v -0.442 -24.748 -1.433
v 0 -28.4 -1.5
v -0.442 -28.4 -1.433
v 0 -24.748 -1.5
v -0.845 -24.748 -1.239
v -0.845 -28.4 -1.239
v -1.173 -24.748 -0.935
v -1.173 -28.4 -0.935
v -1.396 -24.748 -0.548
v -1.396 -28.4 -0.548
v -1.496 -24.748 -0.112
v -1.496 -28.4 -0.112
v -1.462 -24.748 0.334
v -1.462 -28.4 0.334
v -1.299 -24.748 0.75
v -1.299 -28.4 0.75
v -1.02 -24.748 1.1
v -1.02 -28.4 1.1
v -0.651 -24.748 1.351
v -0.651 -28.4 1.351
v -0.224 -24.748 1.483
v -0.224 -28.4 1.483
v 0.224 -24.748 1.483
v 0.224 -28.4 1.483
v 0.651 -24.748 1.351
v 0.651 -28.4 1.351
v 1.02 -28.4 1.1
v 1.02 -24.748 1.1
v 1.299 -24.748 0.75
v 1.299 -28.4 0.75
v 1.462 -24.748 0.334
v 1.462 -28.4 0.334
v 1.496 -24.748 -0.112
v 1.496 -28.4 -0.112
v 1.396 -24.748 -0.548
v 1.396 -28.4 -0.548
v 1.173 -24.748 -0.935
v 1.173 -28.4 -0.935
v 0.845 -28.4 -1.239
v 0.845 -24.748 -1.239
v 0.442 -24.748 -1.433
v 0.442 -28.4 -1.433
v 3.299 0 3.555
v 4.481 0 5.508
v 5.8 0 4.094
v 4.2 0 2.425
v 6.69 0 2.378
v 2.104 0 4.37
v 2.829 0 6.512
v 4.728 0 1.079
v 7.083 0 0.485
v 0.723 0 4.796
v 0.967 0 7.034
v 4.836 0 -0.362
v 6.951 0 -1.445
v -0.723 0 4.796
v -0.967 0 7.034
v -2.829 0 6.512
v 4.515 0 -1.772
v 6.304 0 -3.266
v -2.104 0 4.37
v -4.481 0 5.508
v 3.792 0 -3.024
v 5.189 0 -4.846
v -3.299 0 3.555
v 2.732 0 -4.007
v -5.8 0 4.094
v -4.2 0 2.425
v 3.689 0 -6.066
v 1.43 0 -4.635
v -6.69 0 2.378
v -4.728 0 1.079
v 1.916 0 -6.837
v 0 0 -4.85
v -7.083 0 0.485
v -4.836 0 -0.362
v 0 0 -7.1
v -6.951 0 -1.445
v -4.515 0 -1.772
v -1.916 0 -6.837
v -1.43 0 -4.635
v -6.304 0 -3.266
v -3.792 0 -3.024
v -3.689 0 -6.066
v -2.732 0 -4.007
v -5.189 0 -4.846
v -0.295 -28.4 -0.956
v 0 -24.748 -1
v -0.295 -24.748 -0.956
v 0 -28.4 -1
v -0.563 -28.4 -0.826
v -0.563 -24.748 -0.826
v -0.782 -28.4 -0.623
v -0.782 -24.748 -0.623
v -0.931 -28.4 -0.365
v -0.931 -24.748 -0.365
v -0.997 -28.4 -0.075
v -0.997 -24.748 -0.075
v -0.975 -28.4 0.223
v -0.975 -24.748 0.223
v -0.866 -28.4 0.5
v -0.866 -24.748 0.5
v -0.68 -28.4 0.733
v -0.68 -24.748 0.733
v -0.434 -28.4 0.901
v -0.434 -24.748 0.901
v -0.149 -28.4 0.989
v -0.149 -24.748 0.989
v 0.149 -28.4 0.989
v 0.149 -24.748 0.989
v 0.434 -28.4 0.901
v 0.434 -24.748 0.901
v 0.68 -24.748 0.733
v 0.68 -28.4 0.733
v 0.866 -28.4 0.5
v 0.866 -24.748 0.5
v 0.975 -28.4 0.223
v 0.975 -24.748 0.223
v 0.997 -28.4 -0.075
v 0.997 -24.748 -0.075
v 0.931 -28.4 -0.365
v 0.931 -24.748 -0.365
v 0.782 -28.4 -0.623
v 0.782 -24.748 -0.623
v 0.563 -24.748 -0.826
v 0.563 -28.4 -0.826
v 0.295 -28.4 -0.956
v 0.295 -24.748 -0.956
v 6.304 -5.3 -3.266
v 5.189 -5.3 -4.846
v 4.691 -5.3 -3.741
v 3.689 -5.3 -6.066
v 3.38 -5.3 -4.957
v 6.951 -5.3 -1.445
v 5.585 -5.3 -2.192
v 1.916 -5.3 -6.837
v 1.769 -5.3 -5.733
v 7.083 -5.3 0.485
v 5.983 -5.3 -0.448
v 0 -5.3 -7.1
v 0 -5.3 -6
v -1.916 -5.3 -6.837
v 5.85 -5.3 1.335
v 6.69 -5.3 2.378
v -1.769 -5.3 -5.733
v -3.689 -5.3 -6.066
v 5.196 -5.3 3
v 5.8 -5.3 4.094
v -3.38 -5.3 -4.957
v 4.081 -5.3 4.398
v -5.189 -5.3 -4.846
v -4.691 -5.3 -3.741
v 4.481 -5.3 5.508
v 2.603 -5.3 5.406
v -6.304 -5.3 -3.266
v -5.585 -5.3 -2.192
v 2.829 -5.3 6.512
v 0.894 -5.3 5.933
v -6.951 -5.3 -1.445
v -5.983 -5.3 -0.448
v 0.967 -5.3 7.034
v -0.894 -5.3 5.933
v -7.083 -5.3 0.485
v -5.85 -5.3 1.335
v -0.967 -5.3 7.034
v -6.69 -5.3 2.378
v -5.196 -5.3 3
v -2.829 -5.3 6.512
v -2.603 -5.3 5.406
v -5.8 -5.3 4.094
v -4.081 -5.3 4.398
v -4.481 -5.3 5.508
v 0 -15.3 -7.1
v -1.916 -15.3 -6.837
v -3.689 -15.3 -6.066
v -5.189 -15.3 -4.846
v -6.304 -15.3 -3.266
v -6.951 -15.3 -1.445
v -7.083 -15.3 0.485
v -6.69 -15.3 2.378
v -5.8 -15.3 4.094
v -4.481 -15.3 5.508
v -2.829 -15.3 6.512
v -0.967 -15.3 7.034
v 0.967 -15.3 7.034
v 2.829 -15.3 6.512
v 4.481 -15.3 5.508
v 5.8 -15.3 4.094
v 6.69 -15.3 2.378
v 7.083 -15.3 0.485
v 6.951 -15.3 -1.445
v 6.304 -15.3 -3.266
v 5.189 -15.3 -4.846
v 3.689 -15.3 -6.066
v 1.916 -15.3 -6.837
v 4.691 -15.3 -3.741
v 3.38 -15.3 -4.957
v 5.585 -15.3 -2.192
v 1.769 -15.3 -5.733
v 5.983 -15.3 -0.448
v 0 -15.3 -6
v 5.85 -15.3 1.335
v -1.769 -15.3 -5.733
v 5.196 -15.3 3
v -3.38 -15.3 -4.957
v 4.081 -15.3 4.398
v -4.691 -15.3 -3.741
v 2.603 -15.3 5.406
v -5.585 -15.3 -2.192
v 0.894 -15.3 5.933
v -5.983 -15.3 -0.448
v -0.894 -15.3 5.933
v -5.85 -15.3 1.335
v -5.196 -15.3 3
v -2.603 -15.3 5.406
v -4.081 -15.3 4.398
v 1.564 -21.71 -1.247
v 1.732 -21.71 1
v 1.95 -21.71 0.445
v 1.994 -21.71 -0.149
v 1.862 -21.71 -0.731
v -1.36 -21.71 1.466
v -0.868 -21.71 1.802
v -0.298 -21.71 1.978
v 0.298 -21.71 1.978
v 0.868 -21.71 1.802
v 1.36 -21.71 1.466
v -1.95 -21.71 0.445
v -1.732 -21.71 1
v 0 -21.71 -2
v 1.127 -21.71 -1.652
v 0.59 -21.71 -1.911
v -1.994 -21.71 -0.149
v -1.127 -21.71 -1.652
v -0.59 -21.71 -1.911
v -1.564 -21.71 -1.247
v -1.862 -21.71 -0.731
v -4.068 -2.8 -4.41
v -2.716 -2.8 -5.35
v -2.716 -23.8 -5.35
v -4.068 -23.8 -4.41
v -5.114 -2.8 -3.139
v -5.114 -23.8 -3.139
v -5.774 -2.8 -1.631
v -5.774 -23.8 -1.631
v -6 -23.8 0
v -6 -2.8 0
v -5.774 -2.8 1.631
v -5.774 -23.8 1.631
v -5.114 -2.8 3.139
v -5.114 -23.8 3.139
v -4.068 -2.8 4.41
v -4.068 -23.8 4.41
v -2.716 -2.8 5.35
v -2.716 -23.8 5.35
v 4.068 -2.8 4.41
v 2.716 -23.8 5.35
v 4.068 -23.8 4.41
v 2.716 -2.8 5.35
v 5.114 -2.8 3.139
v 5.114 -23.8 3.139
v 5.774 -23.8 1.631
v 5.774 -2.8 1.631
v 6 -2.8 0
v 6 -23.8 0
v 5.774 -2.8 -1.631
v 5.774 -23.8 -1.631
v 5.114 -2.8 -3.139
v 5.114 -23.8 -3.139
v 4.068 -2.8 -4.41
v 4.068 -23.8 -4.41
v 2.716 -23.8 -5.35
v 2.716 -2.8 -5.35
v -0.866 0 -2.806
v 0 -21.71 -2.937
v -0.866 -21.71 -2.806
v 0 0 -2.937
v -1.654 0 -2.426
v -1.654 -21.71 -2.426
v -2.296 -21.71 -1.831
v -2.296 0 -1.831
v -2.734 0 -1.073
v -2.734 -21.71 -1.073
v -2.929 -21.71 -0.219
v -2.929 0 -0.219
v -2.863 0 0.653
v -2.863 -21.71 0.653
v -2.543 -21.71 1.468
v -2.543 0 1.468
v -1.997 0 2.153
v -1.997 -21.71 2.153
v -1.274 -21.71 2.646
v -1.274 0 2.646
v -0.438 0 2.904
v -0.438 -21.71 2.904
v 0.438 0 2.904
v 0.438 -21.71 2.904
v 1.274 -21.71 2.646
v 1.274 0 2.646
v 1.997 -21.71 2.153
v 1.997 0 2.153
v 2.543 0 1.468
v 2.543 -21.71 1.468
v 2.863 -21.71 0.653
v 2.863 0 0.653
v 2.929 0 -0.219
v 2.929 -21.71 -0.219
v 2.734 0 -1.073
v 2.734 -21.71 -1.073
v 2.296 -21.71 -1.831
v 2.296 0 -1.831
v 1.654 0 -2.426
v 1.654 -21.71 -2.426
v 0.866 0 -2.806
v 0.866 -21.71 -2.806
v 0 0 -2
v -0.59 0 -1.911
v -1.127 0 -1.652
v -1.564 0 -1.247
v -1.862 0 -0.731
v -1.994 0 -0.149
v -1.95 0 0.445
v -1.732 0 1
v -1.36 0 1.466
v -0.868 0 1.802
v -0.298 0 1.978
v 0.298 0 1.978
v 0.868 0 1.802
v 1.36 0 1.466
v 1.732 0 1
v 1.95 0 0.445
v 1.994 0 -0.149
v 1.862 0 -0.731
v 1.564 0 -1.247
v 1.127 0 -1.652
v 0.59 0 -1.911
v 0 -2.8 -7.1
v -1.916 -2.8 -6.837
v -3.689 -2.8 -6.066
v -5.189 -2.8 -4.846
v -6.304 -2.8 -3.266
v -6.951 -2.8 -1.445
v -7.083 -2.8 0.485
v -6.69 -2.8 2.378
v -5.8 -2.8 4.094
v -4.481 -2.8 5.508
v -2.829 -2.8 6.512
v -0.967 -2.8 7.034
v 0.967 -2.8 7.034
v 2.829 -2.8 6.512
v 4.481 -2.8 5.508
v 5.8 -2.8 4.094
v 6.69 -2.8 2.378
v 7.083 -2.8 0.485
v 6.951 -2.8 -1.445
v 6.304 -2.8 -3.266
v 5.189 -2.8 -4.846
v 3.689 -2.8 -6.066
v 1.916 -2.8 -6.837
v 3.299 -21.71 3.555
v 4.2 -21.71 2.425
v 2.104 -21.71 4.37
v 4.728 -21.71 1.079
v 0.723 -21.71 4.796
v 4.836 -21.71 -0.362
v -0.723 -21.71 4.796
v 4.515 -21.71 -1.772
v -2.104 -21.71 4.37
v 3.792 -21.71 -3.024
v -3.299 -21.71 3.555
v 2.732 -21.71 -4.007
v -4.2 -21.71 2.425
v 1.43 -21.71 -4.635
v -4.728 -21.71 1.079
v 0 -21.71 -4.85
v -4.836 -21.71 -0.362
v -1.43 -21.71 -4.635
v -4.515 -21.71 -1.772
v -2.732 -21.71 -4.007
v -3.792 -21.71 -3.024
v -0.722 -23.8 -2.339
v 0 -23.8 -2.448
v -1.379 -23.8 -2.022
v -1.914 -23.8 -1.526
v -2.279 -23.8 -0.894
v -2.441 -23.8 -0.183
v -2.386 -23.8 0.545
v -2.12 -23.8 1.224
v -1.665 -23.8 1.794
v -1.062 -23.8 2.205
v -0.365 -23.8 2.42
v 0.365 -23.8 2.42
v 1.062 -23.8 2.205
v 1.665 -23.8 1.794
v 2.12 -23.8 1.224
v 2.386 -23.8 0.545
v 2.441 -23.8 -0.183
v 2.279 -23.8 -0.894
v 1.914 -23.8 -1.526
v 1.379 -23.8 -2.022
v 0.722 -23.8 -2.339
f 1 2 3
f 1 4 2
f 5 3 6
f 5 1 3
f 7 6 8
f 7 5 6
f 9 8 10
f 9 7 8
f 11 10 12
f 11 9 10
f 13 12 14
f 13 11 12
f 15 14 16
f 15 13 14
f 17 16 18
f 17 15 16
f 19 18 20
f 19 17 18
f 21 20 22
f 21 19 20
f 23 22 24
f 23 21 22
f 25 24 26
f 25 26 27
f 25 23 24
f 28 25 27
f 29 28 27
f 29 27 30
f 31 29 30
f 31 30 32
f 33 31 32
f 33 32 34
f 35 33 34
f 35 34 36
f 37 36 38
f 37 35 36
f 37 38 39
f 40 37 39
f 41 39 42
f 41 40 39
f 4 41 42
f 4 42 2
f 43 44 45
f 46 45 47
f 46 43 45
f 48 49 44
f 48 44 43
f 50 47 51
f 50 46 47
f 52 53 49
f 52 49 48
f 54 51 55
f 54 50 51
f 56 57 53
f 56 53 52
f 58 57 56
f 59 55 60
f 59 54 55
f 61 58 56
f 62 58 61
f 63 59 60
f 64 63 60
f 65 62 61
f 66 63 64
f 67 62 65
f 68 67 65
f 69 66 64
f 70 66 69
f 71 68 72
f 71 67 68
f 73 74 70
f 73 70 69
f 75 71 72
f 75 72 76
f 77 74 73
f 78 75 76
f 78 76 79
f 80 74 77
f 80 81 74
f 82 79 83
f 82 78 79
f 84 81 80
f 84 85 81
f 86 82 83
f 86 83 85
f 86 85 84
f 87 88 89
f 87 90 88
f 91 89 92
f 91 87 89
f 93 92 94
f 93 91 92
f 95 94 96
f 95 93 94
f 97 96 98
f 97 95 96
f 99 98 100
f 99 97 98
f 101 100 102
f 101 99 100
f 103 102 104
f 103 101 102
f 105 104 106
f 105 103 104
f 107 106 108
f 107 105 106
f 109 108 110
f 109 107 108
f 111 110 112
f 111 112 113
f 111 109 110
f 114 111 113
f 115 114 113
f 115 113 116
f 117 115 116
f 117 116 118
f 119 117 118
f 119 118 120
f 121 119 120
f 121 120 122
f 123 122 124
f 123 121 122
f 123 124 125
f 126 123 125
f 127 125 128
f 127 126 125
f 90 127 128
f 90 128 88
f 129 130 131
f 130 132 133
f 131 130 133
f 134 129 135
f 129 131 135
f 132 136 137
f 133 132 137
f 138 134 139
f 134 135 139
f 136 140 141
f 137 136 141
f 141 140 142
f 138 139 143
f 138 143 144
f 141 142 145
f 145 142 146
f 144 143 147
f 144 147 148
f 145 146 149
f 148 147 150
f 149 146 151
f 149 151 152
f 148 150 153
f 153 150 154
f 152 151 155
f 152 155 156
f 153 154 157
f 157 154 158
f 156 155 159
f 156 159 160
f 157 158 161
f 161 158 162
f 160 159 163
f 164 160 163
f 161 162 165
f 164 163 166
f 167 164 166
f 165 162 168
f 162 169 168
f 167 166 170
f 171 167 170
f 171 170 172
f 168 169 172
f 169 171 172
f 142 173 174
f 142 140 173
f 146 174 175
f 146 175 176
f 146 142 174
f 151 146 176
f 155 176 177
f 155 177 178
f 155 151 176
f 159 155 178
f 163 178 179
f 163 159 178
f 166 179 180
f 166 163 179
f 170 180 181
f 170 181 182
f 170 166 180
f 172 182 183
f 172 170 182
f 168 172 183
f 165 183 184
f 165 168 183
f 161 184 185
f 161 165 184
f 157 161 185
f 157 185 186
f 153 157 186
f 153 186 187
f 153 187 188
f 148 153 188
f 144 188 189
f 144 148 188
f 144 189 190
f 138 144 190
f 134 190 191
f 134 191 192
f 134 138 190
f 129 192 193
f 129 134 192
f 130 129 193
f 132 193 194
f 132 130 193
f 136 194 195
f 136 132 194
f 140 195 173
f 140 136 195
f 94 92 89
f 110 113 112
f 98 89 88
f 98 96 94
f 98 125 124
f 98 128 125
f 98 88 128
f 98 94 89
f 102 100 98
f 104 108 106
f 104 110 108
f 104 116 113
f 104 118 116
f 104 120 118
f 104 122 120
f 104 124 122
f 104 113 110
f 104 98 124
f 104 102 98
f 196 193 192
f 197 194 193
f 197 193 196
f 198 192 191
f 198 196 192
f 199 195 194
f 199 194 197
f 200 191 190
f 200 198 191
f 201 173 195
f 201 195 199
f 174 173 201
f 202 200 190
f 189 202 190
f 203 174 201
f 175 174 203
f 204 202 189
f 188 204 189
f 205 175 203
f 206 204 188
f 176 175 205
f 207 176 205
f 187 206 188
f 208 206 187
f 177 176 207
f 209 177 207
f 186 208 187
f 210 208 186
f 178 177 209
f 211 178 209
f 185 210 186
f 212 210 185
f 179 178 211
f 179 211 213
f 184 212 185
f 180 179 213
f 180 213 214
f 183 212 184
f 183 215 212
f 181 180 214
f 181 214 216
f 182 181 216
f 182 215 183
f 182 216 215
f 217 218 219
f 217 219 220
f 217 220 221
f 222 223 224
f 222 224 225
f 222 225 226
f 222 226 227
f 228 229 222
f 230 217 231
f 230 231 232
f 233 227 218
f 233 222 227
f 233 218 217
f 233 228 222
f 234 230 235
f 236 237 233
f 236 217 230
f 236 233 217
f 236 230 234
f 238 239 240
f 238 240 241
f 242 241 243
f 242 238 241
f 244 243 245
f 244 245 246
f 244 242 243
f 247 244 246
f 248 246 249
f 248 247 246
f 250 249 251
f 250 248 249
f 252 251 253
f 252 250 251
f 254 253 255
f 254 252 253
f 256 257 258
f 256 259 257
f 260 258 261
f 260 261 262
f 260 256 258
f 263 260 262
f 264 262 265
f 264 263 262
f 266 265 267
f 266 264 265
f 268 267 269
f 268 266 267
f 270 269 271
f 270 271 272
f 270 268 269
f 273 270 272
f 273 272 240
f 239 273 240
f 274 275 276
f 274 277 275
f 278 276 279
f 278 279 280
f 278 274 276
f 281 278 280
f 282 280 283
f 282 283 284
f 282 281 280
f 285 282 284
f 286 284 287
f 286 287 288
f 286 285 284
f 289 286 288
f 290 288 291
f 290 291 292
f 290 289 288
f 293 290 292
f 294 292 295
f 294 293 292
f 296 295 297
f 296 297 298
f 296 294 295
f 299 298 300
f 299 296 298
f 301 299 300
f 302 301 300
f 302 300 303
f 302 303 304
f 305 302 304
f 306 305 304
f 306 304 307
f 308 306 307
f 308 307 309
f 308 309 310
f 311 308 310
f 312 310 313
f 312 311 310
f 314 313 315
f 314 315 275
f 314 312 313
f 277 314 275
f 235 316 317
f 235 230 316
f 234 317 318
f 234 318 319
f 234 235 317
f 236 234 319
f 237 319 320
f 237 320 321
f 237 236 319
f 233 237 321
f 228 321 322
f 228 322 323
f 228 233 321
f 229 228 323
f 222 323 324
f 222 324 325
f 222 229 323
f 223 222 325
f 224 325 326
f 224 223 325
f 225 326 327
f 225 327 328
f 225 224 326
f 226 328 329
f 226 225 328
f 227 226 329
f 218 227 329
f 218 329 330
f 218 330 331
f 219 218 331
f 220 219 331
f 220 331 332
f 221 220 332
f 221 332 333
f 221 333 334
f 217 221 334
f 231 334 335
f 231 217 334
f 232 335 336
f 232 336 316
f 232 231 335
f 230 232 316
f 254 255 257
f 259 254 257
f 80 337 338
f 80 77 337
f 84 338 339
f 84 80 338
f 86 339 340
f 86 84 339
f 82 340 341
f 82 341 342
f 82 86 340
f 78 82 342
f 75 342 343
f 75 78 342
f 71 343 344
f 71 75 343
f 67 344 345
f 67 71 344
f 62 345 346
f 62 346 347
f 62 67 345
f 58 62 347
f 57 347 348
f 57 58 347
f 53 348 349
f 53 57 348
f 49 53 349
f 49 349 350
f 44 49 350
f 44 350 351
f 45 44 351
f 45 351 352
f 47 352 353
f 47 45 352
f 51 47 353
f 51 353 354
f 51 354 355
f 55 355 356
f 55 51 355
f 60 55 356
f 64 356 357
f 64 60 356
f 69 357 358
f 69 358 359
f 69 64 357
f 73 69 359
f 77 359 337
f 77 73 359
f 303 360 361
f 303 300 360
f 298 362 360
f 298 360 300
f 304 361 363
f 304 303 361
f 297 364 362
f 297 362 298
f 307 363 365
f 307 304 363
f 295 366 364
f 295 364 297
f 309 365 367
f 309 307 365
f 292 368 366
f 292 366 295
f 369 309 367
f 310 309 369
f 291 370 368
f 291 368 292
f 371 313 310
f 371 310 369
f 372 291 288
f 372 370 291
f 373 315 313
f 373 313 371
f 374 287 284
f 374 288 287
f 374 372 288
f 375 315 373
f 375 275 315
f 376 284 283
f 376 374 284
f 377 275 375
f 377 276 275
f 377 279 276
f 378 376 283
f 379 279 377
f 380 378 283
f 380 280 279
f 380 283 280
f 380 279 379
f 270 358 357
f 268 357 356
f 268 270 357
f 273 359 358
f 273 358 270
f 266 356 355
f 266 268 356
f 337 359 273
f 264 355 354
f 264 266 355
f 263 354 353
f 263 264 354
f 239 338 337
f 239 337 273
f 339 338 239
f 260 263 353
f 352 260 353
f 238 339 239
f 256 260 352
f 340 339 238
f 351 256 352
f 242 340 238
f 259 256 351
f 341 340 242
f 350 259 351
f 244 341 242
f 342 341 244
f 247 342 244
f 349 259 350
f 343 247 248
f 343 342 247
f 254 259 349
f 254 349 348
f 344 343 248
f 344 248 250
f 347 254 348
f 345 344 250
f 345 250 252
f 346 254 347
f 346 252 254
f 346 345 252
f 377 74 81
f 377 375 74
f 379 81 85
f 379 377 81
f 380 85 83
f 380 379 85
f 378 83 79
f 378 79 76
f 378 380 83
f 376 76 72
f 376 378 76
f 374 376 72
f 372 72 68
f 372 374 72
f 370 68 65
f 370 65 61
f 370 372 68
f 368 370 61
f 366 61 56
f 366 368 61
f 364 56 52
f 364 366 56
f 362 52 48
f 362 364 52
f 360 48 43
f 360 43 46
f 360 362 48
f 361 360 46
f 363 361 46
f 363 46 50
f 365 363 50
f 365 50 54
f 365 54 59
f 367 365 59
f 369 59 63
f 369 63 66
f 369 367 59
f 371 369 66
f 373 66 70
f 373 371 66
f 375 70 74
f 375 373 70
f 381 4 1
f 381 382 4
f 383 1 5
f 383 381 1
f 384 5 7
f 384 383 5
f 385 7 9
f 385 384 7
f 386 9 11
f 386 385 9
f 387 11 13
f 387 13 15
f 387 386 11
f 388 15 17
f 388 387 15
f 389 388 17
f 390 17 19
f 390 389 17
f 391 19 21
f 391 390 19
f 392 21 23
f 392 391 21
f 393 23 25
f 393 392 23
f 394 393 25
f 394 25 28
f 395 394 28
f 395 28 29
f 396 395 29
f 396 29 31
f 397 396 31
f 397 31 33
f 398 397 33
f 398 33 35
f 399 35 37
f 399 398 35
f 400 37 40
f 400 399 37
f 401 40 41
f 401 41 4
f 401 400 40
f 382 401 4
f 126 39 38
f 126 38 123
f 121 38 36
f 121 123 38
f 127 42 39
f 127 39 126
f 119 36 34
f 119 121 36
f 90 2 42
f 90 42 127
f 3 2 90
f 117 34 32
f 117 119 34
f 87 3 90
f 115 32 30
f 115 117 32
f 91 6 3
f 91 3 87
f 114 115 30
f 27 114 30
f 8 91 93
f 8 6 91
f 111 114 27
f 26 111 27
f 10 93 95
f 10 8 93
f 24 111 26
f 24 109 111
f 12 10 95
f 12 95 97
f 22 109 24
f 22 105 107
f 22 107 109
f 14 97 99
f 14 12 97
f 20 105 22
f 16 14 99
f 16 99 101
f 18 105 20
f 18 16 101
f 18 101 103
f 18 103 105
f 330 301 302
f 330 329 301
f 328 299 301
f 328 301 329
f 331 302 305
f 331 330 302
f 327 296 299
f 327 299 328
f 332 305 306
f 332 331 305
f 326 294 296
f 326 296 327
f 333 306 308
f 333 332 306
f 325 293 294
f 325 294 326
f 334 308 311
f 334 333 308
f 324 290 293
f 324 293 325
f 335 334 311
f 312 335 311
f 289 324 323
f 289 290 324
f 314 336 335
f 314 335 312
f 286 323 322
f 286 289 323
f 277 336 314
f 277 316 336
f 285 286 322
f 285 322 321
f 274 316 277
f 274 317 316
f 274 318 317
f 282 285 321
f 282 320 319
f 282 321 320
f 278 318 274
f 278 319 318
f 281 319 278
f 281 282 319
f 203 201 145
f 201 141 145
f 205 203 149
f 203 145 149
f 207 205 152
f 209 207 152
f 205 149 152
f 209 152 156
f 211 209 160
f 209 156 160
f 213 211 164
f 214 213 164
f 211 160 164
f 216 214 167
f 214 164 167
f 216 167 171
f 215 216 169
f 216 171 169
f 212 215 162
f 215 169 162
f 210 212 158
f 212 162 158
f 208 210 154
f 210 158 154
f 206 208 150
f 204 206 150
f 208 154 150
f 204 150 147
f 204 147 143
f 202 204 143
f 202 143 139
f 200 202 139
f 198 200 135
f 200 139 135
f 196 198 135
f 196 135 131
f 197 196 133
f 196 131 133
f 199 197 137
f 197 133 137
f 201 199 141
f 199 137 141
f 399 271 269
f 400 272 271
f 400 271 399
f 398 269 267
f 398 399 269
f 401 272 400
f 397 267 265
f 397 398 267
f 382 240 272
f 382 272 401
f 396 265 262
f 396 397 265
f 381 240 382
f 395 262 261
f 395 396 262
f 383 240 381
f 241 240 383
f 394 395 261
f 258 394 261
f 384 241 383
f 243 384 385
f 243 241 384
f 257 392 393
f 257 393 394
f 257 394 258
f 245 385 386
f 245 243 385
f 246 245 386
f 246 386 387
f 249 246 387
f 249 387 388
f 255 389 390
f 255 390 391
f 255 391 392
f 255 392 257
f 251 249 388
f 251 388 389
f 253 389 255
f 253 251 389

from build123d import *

# Parameters (mm, degrees)
CUT_EXTRUDE1_START = -21
CUT_EXTRUDE1_DEPTH = 21
SKETCH3_W          = 1.1
SKETCH3_H          = 10


# Read off the part's stored shape, not the designer's step: Cut-Extrude1
with BuildPart() as part:
    # Sketch1 → Revolve1 (revolve)
    with BuildSketch(Plane.XY, mode=Mode.PRIVATE) as revolve1_sk:
        Polygon((7.1, 0), (4.85, 0), (4.85, -21.710144928), (2.936727406, -21.710144928), (2.936727406, 0), (2, 0), (2, -21.710144928), (0, -21.710144928), (0, -24.747826087), (1, -24.747826087), (1, -28.4), (1.5, -28.4), (1.5, -24.747826087), (2.447826087, -23.8), (6, -23.8), (6, -2.8), (7.1, -2.8), align=None)
    revolve(revolve1_sk.sketch.rotate(Axis((0, -21.710144928, 0), (0, 1, 0)), 90), axis=Axis((0, -21.710144928, 0), (0, 1, 0)))

    # Cut-Extrude1 outline → Cut-Extrude1 (cut)
    with BuildSketch(Plane.XZ.offset(23.8).offset(CUT_EXTRUDE1_START)):
        with BuildLine():
            Line((2.716155371, -5.35), (-2.716155371, -5.35))
            ThreePointArc((-2.716155371, -5.35), (0, -6), (2.716155371, -5.35))
        make_face()
        with BuildLine():
            ThreePointArc((2.716155371, 5.35), (0, 6), (-2.716155371, 5.35))
            Line((-2.716155371, 5.35), (2.716155371, 5.35))
        make_face()
    extrude(amount=CUT_EXTRUDE1_DEPTH, mode=Mode.SUBTRACT)


with BuildPart() as body_2:
    # Sketch3 → Revolve2 (revolve)
    with BuildSketch(Plane.XY, mode=Mode.PRIVATE) as revolve2_sk:
        with Locations((6.55, -10.3)):
            Rectangle(SKETCH3_W, SKETCH3_H)
    revolve(revolve2_sk.sketch.rotate(Axis((0, -21.710144928, 0), (0, 1, 0)), 90), axis=Axis((0, -21.710144928, 0), (0, 1, 0)))


solid = Compound([part.part, body_2.part])
